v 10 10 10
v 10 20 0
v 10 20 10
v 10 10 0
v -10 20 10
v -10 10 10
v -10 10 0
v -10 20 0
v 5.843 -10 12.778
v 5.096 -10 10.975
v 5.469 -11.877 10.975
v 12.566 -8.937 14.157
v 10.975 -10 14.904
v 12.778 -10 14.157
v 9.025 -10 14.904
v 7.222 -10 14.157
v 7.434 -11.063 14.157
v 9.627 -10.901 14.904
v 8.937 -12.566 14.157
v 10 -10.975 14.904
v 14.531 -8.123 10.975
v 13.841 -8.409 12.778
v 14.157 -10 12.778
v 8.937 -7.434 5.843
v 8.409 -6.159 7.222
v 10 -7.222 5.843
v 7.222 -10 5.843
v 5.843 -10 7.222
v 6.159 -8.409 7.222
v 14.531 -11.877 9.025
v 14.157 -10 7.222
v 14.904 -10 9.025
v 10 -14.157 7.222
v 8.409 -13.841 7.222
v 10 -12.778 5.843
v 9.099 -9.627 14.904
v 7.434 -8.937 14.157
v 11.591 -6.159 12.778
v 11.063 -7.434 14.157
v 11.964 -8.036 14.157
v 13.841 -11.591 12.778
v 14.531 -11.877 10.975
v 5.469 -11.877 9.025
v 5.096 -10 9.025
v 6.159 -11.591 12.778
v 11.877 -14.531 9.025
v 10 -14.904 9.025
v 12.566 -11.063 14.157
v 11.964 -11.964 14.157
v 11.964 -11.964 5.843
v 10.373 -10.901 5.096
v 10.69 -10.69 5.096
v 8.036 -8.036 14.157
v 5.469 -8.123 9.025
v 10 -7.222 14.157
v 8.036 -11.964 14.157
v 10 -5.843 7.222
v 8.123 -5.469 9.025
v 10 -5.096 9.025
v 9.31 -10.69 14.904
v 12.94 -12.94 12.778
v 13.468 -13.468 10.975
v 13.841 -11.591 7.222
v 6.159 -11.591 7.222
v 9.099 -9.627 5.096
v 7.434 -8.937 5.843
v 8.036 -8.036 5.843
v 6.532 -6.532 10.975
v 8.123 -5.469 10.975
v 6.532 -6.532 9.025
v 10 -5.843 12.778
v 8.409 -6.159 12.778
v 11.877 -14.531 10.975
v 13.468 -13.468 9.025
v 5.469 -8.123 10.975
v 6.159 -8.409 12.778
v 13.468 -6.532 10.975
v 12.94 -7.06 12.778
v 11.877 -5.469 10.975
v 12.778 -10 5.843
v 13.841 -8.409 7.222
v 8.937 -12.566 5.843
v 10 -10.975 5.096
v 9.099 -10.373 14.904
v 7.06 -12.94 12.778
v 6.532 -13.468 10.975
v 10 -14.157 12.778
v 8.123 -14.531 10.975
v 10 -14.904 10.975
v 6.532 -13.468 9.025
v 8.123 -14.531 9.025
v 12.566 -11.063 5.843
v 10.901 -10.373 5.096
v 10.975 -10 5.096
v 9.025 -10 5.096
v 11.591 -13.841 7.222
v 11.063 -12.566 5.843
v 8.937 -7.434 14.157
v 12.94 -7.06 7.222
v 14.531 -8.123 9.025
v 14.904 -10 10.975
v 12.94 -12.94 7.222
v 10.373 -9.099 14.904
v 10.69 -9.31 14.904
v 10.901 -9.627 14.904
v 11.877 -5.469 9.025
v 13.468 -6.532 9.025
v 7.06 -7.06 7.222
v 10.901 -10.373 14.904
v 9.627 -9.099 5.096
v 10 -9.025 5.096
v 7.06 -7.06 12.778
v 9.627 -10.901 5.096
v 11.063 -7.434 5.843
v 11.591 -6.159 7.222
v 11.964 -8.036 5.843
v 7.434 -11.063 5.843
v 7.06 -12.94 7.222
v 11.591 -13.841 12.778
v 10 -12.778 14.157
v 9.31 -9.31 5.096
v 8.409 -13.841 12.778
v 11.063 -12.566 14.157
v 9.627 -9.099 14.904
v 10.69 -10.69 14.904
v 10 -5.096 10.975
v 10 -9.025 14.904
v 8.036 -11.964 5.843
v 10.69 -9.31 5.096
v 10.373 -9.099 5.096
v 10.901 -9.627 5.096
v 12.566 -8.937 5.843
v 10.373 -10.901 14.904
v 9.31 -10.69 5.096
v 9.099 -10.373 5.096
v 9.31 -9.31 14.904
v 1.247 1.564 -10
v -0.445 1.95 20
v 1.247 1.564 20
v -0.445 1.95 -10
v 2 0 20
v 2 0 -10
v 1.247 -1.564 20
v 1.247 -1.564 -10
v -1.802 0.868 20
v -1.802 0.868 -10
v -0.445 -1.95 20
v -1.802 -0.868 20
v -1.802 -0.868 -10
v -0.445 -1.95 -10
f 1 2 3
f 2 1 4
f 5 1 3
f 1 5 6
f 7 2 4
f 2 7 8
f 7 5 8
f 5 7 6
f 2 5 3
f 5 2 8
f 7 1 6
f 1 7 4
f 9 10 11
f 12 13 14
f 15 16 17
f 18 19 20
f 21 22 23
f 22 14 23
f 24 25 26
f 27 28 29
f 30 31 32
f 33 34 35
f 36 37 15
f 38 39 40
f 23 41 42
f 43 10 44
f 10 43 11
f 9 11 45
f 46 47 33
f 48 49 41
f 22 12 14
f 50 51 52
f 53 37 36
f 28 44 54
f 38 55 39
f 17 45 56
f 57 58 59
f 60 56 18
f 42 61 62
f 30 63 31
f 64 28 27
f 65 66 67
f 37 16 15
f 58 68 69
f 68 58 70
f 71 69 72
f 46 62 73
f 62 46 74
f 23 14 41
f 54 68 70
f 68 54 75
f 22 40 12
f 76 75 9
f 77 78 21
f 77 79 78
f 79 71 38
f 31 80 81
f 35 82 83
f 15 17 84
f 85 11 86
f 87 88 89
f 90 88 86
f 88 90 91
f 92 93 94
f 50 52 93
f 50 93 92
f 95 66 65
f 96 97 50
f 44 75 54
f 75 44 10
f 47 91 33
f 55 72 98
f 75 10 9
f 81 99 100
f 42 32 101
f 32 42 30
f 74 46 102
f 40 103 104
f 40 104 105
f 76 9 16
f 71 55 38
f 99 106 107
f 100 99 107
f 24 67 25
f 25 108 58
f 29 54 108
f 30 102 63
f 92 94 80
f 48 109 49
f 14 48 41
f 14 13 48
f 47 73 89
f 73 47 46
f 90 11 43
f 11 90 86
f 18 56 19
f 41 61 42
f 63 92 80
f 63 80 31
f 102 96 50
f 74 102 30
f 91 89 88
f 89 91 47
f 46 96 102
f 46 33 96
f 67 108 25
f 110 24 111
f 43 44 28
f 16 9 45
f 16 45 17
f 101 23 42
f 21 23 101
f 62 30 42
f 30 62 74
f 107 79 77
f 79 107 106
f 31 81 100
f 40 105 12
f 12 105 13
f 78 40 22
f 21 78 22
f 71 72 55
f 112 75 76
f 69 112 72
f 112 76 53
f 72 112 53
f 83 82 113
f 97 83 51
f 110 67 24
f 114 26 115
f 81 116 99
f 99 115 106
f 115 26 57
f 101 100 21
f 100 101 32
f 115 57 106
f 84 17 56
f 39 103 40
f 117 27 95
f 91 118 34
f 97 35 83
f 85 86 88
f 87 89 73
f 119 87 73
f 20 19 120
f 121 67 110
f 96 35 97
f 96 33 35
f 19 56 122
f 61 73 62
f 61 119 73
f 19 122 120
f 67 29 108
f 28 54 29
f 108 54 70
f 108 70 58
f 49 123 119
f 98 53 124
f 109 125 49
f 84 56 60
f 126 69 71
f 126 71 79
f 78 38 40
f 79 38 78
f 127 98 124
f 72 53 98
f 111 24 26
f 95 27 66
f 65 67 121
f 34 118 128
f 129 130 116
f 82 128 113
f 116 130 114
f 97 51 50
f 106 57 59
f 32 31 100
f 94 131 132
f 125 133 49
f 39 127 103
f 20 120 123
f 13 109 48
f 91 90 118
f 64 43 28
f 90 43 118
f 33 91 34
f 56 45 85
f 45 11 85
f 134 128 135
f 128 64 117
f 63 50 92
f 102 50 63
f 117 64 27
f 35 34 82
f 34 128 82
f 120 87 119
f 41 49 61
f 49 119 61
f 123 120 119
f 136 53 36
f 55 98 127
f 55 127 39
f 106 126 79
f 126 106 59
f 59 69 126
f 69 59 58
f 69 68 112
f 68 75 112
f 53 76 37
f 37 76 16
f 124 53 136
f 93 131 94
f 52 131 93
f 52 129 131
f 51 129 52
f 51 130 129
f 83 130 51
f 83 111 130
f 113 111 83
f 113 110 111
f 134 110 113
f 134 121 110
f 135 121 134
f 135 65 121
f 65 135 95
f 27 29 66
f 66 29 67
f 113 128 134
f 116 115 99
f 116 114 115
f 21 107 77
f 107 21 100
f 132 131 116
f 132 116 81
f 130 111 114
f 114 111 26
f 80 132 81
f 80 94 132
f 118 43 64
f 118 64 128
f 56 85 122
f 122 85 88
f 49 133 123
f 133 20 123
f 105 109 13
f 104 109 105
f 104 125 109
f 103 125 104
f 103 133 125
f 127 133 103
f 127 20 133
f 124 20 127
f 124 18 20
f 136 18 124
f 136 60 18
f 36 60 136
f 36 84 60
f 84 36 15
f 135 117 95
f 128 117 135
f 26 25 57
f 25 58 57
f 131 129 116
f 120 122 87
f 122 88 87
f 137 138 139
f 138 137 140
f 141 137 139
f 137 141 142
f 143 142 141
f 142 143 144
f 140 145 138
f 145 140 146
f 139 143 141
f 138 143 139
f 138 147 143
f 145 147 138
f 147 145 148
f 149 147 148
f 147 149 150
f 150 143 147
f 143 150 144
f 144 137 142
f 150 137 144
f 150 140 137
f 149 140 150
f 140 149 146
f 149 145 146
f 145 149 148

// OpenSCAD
translate([-10, 10, 0]) cube([20,10,10]); 
translate([10, -10, 10]) sphere(5); 
translate([0, 0, -10]) cylinder(h=30, r1=2, r2=2); 
